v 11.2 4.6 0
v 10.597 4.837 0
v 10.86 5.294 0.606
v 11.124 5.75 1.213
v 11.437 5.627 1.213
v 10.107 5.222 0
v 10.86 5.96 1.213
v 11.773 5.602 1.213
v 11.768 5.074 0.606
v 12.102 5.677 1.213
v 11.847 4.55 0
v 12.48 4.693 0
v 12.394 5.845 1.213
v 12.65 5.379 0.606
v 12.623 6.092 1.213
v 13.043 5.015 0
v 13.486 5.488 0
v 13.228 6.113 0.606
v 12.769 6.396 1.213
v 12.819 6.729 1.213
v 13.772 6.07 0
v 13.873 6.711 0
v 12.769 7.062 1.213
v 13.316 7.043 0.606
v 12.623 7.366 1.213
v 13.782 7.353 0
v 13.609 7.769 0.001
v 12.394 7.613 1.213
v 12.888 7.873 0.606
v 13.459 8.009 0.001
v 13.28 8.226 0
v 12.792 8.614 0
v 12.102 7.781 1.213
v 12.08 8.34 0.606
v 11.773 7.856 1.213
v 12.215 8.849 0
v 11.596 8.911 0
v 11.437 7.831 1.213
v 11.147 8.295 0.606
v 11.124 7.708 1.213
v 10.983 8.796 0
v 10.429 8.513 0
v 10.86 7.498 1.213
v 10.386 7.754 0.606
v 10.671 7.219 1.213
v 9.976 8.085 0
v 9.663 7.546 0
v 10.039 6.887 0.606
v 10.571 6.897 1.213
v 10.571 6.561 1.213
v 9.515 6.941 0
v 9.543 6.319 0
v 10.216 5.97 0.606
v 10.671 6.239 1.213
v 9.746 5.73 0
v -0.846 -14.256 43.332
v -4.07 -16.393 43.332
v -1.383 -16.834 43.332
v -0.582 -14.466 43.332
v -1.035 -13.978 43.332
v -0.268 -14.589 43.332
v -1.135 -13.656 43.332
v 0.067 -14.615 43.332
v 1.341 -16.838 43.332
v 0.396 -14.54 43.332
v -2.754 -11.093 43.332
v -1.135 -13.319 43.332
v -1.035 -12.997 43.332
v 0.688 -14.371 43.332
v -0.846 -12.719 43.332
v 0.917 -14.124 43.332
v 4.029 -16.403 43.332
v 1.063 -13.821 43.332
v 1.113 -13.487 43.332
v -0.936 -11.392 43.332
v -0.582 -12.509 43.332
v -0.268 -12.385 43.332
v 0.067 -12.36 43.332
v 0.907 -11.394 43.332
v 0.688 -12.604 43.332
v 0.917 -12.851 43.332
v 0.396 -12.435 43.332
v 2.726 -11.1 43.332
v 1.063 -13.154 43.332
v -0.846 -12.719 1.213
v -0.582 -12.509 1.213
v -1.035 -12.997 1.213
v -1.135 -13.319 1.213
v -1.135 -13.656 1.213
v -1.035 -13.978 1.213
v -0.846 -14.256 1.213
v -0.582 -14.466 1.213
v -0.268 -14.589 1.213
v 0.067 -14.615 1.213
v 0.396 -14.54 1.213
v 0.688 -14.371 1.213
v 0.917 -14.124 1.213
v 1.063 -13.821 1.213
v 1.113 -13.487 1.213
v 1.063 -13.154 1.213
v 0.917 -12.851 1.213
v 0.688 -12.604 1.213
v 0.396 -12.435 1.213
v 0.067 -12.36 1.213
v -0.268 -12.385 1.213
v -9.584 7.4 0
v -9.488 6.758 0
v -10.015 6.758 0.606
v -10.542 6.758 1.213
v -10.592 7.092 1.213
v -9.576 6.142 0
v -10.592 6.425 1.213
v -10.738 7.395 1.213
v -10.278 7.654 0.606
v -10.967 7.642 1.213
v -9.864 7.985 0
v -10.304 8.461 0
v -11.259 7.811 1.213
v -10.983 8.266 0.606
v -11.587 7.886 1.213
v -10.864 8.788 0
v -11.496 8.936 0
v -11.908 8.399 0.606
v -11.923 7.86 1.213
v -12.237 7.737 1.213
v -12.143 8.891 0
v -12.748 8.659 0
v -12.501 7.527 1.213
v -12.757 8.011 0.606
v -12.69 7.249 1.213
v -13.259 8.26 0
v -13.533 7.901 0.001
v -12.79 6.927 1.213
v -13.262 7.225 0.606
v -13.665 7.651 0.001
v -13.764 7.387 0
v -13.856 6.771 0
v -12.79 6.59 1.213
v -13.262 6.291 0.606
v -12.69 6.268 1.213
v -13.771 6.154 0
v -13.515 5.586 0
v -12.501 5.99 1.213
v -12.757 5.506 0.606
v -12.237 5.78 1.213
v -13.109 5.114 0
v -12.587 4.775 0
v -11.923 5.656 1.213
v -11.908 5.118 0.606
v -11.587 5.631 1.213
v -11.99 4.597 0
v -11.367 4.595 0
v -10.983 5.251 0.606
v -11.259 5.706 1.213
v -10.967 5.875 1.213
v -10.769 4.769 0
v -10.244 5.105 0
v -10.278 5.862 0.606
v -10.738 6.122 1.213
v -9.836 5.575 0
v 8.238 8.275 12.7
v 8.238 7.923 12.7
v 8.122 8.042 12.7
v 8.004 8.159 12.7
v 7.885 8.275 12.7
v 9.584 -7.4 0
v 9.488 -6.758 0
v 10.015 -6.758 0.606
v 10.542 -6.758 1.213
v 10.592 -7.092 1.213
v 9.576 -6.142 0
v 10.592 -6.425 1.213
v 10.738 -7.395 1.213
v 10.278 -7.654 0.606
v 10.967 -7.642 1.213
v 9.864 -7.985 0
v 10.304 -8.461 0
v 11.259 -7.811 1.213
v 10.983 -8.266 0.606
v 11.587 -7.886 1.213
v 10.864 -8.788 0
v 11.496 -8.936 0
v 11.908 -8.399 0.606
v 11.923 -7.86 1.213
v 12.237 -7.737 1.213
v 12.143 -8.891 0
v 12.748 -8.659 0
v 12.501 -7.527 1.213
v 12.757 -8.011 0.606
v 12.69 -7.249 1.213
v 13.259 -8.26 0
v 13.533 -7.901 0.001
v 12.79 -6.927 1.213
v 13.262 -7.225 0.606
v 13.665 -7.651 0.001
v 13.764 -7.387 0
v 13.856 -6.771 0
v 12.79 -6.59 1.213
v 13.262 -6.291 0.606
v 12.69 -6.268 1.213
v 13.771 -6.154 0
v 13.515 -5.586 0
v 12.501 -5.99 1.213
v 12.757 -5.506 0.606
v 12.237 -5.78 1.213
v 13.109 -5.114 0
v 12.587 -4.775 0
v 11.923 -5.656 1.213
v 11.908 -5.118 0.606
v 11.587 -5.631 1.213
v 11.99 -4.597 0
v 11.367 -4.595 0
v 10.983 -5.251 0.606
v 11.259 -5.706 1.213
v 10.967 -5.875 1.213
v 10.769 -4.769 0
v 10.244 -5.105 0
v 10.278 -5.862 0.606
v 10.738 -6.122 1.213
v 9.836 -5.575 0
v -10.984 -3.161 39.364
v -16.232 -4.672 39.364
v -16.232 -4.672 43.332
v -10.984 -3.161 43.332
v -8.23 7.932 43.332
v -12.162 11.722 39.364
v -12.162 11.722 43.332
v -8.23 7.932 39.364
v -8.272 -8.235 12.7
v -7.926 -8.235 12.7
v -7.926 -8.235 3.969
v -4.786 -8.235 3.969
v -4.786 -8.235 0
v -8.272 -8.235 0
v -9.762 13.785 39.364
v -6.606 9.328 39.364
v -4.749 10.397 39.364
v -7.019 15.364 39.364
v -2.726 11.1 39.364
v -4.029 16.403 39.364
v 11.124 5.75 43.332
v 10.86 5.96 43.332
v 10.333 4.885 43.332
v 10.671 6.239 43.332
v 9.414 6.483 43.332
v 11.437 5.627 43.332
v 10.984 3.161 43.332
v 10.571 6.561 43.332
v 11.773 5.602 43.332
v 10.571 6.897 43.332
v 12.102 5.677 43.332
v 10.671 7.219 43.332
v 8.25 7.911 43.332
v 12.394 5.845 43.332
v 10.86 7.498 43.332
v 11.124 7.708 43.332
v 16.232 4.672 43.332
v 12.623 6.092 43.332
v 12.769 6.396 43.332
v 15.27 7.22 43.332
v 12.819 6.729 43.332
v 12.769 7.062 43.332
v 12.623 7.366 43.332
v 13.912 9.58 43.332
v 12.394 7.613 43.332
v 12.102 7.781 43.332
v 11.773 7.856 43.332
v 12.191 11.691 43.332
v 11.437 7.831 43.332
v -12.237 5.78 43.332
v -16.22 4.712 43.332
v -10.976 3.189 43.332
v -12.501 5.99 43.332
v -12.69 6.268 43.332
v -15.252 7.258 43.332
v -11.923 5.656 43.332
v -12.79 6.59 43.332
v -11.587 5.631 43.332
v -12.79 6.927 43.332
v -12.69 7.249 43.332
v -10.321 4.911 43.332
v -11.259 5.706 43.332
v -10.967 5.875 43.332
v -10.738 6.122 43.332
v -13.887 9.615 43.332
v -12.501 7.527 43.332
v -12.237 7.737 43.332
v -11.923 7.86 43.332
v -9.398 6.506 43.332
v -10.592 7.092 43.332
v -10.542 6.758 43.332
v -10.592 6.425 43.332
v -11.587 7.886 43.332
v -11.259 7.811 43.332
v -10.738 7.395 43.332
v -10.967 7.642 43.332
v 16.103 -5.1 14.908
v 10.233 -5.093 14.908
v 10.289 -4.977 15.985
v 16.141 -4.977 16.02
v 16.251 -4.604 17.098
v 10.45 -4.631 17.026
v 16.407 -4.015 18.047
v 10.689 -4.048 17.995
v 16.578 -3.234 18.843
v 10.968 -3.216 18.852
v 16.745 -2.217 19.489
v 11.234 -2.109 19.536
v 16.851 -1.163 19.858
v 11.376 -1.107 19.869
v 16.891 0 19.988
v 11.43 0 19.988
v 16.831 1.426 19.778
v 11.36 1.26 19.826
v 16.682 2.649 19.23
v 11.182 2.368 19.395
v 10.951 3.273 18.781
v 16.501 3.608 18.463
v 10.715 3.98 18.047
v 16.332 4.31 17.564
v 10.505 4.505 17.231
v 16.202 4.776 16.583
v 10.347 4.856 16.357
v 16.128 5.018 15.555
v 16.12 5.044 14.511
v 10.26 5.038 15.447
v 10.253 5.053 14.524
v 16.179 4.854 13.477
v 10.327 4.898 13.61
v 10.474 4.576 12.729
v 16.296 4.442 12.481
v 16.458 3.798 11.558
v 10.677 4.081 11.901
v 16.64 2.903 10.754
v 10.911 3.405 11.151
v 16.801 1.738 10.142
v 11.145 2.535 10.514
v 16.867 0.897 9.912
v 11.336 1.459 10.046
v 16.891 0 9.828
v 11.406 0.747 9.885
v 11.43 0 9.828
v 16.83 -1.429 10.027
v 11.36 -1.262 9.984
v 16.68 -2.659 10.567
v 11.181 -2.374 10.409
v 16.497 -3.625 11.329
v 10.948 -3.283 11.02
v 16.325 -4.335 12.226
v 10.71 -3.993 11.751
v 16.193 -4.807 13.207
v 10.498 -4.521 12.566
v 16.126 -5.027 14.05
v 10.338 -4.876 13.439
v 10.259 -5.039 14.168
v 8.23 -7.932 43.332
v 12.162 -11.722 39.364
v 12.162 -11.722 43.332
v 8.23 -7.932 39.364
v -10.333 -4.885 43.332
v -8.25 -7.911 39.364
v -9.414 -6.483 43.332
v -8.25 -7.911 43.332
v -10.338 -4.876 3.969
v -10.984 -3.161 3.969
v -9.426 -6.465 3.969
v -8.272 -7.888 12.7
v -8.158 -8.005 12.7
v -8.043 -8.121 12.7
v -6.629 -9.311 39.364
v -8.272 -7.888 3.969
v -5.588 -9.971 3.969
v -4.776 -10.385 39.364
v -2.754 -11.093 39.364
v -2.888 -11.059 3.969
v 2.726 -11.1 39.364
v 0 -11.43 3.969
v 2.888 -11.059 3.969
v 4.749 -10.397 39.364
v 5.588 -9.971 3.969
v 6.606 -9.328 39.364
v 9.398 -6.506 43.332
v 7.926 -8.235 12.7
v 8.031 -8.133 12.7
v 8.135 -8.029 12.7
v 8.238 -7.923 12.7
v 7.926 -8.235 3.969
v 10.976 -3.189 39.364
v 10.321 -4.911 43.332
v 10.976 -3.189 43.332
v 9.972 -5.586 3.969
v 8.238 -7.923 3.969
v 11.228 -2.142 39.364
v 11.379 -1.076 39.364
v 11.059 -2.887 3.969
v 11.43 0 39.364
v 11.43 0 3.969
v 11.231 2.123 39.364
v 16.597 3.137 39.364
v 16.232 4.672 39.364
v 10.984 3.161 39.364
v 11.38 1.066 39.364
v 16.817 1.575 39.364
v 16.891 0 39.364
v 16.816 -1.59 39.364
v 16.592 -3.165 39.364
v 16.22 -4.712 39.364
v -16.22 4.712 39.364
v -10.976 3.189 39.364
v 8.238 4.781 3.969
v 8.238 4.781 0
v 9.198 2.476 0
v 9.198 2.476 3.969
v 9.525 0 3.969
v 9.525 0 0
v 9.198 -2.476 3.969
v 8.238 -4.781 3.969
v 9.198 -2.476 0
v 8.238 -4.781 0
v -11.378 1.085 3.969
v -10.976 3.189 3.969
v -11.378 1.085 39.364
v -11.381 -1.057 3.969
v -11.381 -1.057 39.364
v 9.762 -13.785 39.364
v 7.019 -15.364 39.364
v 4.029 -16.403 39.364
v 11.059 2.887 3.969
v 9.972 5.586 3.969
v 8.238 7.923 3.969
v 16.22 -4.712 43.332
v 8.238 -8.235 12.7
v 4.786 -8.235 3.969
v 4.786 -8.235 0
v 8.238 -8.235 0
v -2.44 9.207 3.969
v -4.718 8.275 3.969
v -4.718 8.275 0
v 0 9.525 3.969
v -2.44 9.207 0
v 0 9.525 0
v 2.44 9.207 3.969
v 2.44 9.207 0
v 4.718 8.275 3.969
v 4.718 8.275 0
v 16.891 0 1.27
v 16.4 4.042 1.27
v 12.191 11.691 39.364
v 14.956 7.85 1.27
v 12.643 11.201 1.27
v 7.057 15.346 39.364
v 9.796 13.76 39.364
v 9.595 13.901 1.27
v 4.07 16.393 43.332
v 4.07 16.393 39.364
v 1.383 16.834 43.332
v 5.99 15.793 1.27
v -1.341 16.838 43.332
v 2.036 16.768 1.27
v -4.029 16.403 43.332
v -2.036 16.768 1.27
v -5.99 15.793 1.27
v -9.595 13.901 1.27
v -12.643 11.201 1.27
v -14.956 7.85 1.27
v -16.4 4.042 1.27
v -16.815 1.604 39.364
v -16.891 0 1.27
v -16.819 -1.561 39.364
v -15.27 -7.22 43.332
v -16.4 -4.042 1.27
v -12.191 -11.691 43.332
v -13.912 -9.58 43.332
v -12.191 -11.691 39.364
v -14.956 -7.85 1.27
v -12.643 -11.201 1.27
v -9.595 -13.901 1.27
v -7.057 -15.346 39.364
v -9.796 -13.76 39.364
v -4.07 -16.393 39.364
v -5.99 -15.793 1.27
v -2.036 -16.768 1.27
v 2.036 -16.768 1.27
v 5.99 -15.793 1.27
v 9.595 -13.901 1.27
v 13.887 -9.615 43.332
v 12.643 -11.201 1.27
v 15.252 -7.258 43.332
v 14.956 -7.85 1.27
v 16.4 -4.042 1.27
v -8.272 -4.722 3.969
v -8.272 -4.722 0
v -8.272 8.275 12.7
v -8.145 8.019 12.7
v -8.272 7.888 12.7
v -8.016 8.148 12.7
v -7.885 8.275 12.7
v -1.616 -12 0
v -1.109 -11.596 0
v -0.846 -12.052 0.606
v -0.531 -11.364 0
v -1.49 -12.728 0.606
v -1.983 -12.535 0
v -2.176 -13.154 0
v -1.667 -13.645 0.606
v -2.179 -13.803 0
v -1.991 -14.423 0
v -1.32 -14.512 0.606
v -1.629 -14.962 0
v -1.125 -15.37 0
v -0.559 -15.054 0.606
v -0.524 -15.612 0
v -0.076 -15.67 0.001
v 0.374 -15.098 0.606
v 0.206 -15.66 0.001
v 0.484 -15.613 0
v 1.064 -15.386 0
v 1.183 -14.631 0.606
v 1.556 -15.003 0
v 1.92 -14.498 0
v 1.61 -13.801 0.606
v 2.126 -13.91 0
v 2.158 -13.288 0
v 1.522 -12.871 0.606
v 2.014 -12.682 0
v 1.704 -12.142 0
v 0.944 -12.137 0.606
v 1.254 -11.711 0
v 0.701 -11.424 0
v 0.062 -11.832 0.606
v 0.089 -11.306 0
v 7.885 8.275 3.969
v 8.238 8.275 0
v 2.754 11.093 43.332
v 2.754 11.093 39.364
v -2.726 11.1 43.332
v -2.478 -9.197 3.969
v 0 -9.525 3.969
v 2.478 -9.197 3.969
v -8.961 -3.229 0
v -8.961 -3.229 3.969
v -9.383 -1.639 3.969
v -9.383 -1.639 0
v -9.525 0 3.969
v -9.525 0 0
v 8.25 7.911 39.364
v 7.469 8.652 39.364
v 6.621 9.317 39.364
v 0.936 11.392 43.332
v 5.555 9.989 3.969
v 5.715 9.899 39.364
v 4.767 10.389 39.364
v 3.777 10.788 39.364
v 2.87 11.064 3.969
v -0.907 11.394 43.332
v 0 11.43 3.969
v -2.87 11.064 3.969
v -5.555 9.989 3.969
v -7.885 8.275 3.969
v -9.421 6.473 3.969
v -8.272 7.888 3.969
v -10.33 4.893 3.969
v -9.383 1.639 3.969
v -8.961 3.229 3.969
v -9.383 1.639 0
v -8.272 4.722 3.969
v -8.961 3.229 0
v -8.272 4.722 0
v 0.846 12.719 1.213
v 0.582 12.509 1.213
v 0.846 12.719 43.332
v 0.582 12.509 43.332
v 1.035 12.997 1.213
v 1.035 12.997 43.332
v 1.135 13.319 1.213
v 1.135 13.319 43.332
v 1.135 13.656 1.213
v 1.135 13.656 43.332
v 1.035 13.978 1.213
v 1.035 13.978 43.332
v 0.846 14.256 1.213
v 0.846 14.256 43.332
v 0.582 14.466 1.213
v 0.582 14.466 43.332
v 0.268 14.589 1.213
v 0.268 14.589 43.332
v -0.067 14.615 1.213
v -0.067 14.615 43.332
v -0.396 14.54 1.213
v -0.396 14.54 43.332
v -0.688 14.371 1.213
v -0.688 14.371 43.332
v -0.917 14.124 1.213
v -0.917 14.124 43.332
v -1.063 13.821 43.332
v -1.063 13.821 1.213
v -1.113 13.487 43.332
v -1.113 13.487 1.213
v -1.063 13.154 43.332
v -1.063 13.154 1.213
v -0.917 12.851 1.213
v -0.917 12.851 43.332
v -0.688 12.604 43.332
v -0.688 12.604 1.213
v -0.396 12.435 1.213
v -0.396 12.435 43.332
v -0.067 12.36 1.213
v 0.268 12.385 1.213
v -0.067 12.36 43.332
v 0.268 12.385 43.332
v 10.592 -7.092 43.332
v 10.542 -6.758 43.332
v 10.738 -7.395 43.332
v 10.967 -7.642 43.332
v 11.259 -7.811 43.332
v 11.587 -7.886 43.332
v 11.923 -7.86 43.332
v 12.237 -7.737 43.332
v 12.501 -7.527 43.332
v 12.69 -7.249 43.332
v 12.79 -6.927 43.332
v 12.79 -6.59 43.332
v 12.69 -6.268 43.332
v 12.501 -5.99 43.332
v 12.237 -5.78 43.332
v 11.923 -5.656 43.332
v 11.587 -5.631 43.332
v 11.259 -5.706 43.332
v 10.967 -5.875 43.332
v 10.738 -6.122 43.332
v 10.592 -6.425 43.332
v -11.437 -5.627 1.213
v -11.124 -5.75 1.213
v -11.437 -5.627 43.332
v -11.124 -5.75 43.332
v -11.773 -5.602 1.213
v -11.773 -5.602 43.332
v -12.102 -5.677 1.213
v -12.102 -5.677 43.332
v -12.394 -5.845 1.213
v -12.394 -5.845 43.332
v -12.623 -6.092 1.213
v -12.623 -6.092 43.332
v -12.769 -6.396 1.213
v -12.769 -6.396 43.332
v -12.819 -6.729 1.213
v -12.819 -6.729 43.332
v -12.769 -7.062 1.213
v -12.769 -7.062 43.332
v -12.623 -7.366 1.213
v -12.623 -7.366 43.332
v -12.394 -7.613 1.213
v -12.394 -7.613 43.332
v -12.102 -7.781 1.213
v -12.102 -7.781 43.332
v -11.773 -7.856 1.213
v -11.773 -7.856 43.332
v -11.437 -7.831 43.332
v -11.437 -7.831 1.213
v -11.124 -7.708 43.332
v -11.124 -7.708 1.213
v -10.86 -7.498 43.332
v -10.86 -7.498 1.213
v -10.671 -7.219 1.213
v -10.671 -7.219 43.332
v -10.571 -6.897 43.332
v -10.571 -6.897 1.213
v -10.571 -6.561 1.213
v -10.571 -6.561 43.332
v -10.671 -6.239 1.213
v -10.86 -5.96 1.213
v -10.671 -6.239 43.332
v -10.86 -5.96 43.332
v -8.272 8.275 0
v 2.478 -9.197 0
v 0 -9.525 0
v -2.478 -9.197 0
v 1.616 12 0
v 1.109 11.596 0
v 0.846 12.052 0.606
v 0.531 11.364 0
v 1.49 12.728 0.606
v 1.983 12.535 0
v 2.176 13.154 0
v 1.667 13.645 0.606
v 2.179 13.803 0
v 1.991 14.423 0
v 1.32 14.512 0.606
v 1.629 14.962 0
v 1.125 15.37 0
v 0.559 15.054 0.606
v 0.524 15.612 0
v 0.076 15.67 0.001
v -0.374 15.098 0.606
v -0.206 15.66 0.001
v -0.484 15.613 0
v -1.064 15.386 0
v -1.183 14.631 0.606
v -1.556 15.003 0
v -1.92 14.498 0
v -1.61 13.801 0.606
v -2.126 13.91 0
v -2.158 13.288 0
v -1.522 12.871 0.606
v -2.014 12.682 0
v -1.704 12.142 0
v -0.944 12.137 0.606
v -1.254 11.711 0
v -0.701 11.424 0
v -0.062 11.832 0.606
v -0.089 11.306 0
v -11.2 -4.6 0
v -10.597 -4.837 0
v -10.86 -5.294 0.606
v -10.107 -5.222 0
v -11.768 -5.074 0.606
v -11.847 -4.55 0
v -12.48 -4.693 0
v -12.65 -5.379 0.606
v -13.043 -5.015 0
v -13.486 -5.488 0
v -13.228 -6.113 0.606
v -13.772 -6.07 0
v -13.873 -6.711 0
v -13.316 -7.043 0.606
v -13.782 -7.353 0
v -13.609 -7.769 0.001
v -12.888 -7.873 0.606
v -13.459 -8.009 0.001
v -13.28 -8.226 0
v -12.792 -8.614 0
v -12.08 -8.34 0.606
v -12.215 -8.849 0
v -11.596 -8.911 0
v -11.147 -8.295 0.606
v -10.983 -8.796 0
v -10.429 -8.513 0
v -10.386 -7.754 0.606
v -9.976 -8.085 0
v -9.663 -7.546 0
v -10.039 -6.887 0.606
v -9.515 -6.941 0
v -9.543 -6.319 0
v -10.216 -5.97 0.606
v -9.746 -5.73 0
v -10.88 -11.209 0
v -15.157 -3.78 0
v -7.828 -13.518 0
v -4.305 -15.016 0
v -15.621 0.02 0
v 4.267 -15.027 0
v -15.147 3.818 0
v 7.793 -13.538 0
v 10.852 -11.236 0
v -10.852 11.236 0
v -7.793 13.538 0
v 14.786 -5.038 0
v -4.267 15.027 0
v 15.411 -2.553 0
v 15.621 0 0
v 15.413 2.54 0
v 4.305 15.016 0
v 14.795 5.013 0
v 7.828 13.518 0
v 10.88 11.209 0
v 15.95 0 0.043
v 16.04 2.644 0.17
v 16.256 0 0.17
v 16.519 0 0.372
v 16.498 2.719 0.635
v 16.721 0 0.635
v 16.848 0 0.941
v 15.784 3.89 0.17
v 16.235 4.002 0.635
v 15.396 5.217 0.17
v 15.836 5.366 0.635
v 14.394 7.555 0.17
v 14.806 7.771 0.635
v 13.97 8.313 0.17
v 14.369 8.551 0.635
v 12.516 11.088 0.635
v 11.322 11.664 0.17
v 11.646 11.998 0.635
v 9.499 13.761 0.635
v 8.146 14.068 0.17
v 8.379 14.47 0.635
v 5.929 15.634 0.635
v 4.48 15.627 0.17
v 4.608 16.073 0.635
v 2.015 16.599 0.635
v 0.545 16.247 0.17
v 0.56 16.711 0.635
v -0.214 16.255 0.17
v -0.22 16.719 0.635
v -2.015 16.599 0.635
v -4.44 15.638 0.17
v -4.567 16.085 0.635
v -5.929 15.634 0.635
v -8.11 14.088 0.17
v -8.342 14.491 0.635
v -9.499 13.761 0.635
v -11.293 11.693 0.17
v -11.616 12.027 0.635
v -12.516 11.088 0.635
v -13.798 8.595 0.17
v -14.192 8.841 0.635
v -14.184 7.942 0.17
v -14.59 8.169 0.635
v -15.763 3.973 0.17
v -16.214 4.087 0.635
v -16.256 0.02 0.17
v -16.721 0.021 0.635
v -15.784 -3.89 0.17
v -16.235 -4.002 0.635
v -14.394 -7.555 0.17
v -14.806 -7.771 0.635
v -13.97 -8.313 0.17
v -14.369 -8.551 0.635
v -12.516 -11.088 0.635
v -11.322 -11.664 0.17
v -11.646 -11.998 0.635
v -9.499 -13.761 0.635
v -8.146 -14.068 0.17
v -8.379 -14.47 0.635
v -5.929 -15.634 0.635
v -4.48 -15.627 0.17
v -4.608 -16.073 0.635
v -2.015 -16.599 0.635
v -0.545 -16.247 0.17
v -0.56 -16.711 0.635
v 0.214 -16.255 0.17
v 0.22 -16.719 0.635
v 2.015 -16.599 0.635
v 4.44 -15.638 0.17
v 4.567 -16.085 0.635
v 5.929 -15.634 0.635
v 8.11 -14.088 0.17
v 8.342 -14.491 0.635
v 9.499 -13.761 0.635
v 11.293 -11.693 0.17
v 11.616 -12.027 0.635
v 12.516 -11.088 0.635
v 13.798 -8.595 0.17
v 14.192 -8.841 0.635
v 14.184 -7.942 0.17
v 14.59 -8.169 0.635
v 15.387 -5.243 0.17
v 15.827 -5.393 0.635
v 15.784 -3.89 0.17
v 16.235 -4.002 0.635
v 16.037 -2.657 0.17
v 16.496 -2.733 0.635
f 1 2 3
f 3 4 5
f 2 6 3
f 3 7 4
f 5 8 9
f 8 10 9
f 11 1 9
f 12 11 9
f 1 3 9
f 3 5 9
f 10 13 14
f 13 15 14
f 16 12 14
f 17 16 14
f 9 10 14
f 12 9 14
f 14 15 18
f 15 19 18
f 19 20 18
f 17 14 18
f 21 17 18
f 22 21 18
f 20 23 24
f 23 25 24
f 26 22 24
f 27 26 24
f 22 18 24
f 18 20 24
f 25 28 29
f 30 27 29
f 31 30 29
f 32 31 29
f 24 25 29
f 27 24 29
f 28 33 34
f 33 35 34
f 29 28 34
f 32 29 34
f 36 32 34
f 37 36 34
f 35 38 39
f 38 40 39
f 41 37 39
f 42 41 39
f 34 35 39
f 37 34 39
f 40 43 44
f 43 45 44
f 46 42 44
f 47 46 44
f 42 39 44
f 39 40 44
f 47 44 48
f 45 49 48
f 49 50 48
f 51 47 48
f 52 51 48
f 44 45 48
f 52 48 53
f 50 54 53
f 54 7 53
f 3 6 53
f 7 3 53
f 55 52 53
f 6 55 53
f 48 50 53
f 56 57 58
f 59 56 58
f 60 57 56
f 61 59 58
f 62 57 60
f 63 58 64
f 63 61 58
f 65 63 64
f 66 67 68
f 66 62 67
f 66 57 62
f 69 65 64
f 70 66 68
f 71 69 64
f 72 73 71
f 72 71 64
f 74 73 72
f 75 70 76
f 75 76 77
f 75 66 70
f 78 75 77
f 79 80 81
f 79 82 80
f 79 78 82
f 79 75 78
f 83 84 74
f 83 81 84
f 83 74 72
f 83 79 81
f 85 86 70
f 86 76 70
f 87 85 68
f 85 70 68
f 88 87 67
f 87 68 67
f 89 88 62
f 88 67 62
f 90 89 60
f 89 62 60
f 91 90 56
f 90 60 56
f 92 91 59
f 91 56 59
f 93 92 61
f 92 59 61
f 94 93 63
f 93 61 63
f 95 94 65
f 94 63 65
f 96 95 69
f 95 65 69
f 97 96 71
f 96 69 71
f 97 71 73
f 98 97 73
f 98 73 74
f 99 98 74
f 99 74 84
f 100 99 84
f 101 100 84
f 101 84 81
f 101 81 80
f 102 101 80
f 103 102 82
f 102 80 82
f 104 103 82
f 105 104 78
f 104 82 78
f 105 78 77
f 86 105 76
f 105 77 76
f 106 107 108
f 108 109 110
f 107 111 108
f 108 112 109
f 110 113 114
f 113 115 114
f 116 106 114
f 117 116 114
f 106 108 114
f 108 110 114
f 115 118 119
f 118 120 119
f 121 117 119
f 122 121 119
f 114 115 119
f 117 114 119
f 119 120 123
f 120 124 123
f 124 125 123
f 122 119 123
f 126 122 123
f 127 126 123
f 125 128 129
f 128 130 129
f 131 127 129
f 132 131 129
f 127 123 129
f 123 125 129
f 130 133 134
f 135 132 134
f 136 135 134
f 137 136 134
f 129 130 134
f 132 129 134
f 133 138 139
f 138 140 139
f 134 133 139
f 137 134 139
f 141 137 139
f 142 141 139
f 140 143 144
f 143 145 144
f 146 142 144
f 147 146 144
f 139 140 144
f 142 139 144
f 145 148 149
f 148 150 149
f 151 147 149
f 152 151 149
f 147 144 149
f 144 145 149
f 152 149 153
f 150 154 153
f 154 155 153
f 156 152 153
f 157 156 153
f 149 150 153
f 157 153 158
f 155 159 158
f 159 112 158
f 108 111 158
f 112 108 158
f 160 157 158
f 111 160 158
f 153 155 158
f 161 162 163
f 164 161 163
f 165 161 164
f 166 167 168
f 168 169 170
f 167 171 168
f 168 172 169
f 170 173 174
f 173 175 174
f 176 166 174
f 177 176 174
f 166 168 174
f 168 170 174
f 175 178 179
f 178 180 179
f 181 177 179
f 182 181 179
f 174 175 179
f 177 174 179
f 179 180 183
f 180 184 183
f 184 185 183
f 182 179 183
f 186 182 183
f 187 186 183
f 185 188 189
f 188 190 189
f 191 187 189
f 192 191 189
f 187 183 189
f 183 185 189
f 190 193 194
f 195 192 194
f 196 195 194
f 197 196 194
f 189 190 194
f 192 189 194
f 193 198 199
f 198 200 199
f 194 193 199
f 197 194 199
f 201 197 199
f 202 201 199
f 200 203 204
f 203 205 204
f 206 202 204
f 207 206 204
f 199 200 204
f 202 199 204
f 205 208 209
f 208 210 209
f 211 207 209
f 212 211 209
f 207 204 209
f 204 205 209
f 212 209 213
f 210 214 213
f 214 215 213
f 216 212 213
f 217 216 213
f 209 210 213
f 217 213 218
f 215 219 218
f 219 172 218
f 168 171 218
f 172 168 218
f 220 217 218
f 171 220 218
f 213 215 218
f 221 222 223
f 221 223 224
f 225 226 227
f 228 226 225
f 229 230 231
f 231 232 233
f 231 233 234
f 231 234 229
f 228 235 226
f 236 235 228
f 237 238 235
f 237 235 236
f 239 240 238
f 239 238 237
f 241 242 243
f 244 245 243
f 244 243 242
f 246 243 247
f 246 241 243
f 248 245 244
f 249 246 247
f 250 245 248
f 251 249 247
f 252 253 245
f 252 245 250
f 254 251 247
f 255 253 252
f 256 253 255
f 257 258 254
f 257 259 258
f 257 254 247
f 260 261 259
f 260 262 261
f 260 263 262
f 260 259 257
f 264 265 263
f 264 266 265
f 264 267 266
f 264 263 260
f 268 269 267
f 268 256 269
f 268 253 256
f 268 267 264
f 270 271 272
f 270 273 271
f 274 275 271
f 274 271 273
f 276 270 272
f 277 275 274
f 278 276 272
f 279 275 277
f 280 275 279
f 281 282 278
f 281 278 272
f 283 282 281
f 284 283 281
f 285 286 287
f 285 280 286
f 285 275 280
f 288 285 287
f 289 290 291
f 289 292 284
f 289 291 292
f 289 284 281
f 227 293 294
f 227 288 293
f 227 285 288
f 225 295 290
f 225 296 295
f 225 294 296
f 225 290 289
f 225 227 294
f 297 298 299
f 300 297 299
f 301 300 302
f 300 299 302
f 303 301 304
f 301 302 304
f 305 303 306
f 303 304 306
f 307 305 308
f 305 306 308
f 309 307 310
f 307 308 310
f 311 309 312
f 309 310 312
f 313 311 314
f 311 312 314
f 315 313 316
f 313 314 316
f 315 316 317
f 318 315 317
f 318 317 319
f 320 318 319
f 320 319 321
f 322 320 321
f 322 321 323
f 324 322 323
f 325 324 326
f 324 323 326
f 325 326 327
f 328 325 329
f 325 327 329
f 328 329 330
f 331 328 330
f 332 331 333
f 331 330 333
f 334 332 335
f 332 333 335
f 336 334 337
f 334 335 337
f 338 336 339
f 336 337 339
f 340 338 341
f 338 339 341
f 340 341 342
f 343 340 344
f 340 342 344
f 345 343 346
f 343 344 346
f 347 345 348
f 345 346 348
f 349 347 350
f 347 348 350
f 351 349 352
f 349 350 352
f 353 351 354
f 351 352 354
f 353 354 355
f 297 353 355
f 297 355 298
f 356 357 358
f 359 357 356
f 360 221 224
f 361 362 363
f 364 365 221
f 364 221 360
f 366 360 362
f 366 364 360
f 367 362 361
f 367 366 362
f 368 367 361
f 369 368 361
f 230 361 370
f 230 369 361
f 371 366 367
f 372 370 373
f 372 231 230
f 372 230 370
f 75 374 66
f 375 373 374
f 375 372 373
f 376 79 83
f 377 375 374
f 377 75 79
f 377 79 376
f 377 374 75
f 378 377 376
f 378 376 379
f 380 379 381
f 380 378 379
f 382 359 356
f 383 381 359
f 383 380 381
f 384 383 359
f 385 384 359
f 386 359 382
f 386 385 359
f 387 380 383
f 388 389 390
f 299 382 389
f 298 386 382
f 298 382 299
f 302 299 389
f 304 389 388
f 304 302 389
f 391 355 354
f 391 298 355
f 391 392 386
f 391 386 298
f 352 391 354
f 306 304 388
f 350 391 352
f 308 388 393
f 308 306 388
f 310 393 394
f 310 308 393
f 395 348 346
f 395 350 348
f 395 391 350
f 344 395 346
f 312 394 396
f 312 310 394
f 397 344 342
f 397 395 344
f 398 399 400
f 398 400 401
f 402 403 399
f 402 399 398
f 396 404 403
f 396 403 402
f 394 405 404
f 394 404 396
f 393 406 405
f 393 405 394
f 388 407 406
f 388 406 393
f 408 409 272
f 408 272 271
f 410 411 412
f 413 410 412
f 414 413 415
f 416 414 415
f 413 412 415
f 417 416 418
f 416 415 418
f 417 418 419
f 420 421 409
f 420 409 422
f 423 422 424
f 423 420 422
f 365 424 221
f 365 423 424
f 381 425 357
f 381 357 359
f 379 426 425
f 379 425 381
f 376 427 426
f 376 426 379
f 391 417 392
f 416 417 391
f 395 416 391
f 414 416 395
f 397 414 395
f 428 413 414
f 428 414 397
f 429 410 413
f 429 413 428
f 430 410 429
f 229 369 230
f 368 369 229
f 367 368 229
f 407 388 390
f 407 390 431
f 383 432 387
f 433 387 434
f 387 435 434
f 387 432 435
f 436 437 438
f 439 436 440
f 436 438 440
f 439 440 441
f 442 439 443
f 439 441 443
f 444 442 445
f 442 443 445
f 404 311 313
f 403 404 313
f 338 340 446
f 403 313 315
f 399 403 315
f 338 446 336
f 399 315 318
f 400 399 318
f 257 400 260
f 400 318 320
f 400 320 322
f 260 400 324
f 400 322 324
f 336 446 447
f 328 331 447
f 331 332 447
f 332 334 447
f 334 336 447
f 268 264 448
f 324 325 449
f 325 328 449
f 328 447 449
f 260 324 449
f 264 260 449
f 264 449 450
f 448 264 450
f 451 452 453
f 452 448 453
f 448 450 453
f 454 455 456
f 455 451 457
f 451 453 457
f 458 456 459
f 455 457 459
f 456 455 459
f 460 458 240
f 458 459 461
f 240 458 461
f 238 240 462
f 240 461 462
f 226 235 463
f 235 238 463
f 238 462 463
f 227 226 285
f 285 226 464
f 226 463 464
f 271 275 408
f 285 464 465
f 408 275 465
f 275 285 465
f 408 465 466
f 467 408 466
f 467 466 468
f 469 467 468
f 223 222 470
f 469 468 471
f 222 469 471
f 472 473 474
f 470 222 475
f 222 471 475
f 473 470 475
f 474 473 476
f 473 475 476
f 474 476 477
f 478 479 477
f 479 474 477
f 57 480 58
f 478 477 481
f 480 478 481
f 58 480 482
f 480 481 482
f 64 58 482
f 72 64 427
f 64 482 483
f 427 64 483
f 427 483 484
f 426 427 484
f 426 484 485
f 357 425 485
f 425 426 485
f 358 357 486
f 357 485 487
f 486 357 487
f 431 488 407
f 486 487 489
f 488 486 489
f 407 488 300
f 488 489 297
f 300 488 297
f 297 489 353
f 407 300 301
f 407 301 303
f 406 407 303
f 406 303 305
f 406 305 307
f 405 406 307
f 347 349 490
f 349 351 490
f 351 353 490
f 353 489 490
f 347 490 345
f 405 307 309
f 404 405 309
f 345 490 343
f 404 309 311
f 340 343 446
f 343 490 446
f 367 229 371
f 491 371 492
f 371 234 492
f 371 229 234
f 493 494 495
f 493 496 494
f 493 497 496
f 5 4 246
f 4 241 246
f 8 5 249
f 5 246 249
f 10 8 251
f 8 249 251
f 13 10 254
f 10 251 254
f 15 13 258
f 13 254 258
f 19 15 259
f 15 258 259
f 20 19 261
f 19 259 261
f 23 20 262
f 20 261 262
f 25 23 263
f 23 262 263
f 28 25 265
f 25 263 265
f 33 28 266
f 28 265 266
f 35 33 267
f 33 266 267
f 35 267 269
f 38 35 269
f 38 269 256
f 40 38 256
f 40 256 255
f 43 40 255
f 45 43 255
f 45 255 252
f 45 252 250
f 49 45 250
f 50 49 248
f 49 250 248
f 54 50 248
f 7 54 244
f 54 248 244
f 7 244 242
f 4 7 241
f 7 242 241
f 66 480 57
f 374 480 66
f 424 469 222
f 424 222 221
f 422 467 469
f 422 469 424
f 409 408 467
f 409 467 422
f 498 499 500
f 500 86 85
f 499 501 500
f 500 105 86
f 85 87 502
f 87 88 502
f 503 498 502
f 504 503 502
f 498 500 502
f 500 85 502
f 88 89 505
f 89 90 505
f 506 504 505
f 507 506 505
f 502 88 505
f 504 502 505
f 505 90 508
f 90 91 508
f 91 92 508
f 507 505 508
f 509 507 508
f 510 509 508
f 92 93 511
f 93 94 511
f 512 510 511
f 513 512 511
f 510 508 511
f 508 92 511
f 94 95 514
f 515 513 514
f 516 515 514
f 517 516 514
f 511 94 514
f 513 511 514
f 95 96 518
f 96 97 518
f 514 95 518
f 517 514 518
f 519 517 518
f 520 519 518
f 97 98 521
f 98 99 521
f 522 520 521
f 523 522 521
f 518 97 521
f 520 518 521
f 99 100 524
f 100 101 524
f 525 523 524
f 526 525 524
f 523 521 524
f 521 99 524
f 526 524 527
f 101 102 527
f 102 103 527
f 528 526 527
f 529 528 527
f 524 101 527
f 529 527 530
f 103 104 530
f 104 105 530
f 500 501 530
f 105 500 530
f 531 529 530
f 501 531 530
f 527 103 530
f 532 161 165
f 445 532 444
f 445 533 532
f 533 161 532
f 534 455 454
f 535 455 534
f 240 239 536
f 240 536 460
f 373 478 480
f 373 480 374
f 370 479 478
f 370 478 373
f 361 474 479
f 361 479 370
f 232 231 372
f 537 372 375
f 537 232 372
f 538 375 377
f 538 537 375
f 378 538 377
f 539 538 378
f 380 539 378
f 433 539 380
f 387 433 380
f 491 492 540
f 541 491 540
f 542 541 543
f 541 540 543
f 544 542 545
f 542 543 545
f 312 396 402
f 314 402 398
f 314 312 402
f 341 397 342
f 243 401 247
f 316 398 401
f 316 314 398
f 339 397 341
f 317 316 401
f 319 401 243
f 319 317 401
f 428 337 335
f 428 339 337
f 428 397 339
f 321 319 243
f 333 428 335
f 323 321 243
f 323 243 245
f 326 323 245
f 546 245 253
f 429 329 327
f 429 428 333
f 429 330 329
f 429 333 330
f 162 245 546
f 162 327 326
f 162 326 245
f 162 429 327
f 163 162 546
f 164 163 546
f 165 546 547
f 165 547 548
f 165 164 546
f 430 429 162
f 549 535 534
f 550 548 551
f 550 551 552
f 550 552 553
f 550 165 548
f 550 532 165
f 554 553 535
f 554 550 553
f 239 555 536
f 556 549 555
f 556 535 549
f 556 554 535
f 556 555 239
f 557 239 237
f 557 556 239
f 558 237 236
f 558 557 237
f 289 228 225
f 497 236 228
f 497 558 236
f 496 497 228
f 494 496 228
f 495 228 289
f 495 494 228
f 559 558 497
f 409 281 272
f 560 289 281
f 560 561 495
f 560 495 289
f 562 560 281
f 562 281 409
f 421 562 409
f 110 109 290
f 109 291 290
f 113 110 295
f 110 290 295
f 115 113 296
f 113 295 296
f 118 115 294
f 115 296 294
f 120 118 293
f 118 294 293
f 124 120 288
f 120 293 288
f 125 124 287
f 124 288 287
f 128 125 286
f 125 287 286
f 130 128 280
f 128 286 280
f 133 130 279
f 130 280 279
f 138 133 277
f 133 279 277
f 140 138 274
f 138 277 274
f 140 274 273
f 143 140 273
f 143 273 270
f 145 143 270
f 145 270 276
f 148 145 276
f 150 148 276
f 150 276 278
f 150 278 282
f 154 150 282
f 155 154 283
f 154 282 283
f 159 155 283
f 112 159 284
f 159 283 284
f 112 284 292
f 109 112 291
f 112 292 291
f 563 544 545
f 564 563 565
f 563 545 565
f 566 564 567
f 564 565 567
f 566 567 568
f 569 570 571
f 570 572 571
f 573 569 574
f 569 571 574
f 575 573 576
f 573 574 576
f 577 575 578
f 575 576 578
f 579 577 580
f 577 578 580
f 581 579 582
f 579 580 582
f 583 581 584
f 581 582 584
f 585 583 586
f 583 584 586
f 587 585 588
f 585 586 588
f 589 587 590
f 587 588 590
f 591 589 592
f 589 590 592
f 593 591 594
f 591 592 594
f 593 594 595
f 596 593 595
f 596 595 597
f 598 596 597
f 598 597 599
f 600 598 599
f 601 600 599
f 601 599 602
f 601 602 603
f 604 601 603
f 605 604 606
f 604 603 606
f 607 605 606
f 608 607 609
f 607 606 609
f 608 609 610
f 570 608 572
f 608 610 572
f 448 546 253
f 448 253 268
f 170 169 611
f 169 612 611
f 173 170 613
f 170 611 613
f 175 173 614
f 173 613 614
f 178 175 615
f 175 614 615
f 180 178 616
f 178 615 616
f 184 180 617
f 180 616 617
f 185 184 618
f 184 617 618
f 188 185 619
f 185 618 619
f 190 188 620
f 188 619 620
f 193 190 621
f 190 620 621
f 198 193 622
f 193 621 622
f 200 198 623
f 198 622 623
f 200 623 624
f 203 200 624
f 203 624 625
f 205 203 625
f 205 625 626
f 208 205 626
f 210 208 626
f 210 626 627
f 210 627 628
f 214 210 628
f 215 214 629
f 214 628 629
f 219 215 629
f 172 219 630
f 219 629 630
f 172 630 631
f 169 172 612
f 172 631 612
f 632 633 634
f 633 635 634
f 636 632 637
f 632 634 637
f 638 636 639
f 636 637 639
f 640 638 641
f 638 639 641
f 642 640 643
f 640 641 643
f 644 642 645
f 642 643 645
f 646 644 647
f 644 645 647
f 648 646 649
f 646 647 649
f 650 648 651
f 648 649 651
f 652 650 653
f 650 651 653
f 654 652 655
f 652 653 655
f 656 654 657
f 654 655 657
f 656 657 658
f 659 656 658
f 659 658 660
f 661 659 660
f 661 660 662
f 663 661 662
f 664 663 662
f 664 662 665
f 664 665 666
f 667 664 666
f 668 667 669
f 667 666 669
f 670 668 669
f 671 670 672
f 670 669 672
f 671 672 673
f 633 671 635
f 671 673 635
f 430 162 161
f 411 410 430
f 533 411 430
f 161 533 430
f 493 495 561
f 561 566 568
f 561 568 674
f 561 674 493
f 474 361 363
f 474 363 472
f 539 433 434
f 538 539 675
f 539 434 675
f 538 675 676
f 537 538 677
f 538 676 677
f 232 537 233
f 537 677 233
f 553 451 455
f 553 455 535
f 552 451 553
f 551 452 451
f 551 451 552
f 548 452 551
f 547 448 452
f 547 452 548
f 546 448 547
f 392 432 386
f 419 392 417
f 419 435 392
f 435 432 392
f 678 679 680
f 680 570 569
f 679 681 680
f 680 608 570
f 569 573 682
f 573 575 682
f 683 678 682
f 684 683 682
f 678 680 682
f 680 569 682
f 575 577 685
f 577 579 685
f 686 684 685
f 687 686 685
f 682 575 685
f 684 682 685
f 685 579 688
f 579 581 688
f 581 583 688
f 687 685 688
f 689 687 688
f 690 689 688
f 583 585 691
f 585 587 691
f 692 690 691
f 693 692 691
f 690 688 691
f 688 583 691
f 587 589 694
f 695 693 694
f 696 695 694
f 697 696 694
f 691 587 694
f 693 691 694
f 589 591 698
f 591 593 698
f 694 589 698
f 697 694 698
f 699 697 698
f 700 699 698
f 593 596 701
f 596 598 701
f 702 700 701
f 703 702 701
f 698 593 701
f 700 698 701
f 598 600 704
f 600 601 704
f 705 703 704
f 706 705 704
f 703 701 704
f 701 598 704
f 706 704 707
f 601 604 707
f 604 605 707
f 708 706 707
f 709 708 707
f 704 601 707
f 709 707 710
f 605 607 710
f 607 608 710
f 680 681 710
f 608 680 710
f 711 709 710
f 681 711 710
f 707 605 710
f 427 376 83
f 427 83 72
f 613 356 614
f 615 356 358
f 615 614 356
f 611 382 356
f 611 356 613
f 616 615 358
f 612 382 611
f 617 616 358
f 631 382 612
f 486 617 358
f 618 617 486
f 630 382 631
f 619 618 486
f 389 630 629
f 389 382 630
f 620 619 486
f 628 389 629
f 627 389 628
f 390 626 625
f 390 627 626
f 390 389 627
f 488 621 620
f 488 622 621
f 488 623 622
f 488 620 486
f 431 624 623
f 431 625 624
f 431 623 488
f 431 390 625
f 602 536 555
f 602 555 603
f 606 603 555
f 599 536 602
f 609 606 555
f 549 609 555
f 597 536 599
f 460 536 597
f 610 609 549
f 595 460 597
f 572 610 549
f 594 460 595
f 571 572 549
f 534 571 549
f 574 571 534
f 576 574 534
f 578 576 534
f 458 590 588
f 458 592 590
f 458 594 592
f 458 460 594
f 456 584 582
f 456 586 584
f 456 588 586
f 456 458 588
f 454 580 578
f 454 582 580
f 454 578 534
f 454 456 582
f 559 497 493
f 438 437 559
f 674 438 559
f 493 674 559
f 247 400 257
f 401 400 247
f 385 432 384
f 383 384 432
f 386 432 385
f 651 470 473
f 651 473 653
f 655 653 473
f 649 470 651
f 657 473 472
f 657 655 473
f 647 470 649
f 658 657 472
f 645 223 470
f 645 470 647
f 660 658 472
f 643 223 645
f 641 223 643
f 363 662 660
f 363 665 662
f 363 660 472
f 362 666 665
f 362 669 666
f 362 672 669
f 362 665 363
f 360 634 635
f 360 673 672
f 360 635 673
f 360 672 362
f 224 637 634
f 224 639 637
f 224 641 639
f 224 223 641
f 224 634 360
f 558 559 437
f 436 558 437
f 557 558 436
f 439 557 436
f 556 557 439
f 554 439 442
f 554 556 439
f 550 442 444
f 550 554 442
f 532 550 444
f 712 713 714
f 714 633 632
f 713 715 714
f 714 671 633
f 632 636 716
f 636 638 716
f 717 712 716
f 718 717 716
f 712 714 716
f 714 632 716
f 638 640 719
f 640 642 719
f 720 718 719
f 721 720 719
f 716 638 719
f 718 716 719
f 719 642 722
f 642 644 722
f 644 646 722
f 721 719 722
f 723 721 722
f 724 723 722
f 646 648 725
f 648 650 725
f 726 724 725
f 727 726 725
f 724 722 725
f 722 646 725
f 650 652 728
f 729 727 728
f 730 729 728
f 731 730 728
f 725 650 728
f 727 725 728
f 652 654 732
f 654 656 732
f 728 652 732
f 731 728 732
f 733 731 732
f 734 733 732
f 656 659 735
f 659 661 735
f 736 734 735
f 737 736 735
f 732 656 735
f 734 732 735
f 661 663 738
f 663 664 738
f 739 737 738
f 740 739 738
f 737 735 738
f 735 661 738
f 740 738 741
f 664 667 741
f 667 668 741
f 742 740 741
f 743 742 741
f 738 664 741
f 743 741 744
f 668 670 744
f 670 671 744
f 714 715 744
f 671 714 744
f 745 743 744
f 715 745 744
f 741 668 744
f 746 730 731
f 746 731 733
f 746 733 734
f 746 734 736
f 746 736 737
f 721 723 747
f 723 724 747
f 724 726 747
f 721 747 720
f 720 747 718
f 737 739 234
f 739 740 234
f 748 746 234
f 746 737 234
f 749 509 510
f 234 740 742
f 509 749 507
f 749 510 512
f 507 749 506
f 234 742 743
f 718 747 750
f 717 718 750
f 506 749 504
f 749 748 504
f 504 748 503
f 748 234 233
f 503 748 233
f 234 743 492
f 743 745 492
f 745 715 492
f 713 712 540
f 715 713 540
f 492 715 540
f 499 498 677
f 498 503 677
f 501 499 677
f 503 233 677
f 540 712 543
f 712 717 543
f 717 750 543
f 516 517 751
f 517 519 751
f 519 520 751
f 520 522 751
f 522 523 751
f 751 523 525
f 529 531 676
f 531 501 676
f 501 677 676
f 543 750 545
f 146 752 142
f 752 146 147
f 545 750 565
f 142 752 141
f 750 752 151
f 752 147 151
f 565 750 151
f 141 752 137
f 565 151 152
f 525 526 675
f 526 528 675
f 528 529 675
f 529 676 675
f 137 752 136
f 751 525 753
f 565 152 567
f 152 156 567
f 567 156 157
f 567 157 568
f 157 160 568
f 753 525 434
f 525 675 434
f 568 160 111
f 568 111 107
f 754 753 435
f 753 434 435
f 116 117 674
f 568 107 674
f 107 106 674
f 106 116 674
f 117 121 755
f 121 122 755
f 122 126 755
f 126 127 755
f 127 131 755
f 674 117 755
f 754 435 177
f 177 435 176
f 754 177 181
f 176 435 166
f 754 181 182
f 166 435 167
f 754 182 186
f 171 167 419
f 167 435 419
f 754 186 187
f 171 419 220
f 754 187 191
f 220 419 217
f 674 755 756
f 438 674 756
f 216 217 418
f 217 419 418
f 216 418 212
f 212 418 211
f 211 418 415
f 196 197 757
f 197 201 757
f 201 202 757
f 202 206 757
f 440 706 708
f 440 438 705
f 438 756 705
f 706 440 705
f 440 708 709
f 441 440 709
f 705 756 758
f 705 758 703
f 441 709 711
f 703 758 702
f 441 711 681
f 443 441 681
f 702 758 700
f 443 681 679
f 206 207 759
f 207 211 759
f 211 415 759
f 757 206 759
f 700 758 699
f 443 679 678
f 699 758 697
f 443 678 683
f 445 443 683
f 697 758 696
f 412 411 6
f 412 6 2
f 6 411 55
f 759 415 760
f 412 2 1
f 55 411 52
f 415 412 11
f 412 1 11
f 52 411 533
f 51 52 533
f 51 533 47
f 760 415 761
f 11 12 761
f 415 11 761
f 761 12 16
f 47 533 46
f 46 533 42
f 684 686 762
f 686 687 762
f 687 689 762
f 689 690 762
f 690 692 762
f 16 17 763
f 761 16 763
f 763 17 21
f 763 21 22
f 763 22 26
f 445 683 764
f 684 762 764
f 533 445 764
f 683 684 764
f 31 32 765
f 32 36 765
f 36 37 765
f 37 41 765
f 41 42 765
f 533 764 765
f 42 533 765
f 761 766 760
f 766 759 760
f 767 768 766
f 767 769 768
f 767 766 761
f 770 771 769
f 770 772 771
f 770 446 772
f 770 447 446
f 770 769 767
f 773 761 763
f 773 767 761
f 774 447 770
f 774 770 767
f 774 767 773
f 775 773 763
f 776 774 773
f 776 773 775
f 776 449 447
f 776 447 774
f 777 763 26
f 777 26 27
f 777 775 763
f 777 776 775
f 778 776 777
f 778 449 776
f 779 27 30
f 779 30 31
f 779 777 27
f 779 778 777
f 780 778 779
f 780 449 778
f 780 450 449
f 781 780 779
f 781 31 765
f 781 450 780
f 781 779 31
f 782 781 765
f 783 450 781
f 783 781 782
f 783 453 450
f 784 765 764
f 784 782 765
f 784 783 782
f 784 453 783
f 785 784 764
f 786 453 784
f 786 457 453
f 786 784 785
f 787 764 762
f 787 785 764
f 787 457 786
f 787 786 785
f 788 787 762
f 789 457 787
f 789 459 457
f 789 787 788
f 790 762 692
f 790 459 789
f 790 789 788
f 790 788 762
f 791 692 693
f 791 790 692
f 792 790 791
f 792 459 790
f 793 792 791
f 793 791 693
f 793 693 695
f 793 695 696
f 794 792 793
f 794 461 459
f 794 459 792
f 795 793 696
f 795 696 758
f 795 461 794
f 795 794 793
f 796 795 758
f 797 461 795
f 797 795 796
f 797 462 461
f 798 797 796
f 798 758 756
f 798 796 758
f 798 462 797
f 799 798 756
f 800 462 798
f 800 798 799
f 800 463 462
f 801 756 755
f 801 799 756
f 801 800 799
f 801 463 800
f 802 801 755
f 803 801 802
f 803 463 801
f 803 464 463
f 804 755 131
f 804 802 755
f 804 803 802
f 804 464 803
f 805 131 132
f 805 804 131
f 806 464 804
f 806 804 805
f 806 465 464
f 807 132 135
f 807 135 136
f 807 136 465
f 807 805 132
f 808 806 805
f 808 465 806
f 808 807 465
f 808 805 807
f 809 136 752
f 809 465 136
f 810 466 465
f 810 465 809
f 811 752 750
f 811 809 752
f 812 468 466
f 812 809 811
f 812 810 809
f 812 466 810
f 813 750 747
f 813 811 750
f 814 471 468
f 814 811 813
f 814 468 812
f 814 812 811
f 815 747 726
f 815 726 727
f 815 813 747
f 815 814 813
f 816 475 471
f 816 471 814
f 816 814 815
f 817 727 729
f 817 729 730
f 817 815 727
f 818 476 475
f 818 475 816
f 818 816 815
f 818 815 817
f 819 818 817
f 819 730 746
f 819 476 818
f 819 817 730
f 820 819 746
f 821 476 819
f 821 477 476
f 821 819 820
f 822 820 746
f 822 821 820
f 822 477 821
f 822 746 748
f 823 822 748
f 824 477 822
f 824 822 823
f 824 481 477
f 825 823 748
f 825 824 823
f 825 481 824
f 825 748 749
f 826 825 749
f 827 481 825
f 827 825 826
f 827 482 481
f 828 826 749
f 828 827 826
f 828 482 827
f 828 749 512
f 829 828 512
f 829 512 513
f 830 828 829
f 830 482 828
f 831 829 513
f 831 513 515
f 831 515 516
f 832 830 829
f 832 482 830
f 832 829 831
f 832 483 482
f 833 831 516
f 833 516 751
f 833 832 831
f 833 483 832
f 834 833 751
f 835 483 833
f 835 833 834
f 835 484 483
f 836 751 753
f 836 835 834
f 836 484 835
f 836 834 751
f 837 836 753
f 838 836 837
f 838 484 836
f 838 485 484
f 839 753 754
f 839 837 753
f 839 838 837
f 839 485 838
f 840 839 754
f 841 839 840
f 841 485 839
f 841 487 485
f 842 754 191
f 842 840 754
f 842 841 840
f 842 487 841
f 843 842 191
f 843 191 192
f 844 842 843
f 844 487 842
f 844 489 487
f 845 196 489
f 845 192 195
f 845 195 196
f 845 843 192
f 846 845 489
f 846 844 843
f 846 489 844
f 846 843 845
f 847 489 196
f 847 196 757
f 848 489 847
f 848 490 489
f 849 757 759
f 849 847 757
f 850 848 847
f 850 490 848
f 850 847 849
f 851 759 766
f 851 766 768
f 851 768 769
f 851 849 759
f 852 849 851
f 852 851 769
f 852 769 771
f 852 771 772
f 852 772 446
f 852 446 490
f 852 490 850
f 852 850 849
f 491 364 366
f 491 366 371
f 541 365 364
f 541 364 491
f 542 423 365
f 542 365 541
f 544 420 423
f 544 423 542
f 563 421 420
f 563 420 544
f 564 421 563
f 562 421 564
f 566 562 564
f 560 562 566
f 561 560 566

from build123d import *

# Parameters (mm, degrees)
SKETCH1_R                                      = 16.891
BOSS_EXTRUDE1_DEPTH                            = 43.3324
SKETCH9_R                                      = 9.525
CUT_EXTRUDE6_DEPTH                             = 50.480386536
SKETCH10_R                                     = 11.43
BOSS_EXTRUDE2_DEPTH                            = 19.05
CUT_EXTRUDE7_START                             = -39.36365
SKETCH11_R                                     = 9.525
CUT_EXTRUDE7_DEPTH                             = 39.36365
CUT_EXTRUDE8_START                             = -3.96875
CUT_EXTRUDE8_DEPTH                             = 3.96875
CSK_FOR_2_FLAT_HEAD_MACHINE_SCREW1_D           = 2.2606
CSK_FOR_2_FLAT_HEAD_MACHINE_SCREW1_CSINK_D     = 4.3688
CSK_FOR_2_FLAT_HEAD_MACHINE_SCREW1_CSINK_ANGLE = 82
CIRPATTERN1_COUNT                              = 6
F_1_2_0_4_DIAMETER_HOLE1_D                     = 10.16
F_1_2_0_4_DIAMETER_HOLE1_DEPTH                 = 12.7
F_1_2_0_4_DIAMETER_HOLE1_TIP                   = 3.052371945
FILLET1_R                                      = 1.27
SKETCH16_W                                     = 16.51
SKETCH16_H                                     = 16.51
CUT_EXTRUDE9_DEPTH                             = 12.7


with BuildPart() as part:
    # Sketch1 → Boss-Extrude1 (new body)
    with BuildSketch(Plane.XY):
        Circle(SKETCH1_R)
    extrude(amount=BOSS_EXTRUDE1_DEPTH)

    # Sketch9 → Cut-Extrude6 (cut, through all)
    with BuildSketch(Plane(origin=(0, 0, 0), x_dir=(-1, 0, 0), z_dir=(0, 0, -1))):
        Circle(SKETCH9_R)
        with BuildLine():
            ThreePointArc((-5.359640753, -7.874), (0, -9.525), (5.359640753, -7.874))
            Line((5.359640753, -7.874), (-5.359640753, -7.874))
        make_face()
        with BuildLine():
            ThreePointArc((-7.874, 5.359640753), (-9.525, 0), (-7.874, -5.359640753))
            Line((-7.874, -5.359640753), (-7.874, 5.359640753))
        make_face()
        with BuildLine():
            Line((-5.359640753, 7.874), (5.359640753, 7.874))
            ThreePointArc((5.359640753, 7.874), (0, 9.525), (-5.359640753, 7.874))
        make_face()
        with BuildLine():
            Line((7.874, 5.359640753), (7.874, -5.359640753))
            ThreePointArc((7.874, -5.359640753), (9.102897204, -2.804084075), (9.525, 0))
            ThreePointArc((9.525, 0), (9.102897204, 2.804084075), (7.874, 5.359640753))
        make_face()
    extrude(amount=-CUT_EXTRUDE6_DEPTH, mode=Mode.SUBTRACT)

    # Sketch10 → Boss-Extrude2 (add)
    # profile 1 of 2: a face of its own
    with BuildSketch(Plane(origin=(0, 0, 0), x_dir=(-1, 0, 0), z_dir=(0, 0, -1))):
        Circle(SKETCH10_R)
        with BuildLine():
            ThreePointArc((-5.359640753, -7.874), (-4.453933477, 8.419507206), (9.525, 0))
            ThreePointArc((9.525, 0), (8.419507206, -4.453933477), (5.359640753, -7.874))
            ThreePointArc((5.359640753, -7.874), (0, -9.525), (-5.359640753, -7.874))
        make_face(mode=Mode.SUBTRACT)
    # profile 2 of 2: a face of its own
    with BuildSketch(Plane(origin=(0, 0, 0), x_dir=(-1, 0, 0), z_dir=(0, 0, -1))):
        Circle(SKETCH10_R)
        with BuildLine():
            ThreePointArc((-5.359640753, -7.874), (-4.453933477, 8.419507206), (9.525, 0))
            ThreePointArc((9.525, 0), (8.419507206, -4.453933477), (5.359640753, -7.874))
            ThreePointArc((5.359640753, -7.874), (0, -9.525), (-5.359640753, -7.874))
        make_face(mode=Mode.SUBTRACT)
    extrude(amount=-BOSS_EXTRUDE2_DEPTH)

    # Sketch11 → Cut-Extrude7 (cut)
    with BuildSketch(Plane.XY.offset(43.3324).offset(CUT_EXTRUDE7_START)):
        with BuildLine():
            Line((-9.153468369, -2.634319991), (-10.984162043, -3.161183989))
            ThreePointArc((-10.984162043, -3.161183989), (1.596234295, -11.317991698), (11.43, 0))
            ThreePointArc((11.43, 0), (1.610471515, 11.315974615), (-10.976173491, 3.188810986))
            Line((-10.976173491, 3.188810986), (-9.146811242, 2.657342489))
            ThreePointArc((-9.146811242, 2.657342489), (1.342059596, 9.429978846), (9.525, 0))
            ThreePointArc((9.525, 0), (1.330195246, -9.431659748), (-9.153468369, -2.634319991))
        make_face()
        with Locations(Location((0, 0, 0), (0, 0, 180))):
            Circle(SKETCH11_R)
        with BuildLine():
            ThreePointArc((-10.984162043, -3.161183989), (-11.297244321, 0.014212394), (-10.976173491, 3.188810986))
            Line((-10.976173491, 3.188810986), (0, 0))
            Line((0, 0), (-10.984162043, -3.161183989))
        make_face()
        with BuildLine():
            ThreePointArc((-10.976173491, 3.188810986), (-11.429990955, 0.014379395), (-10.984162043, -3.161183989))
            ThreePointArc((-10.984162043, -3.161183989), (-11.297244321, 0.014212394), (-10.976173491, 3.188810986))
        make_face()
    extrude(amount=CUT_EXTRUDE7_DEPTH, mode=Mode.SUBTRACT)

    # Sketch11<4> → Cut-Extrude8 (cut)
    with BuildSketch(Plane.XY.offset(43.3324).offset(CUT_EXTRUDE8_START)):
        with BuildLine():
            ThreePointArc((-10.976173491, 3.188810986), (-11.297244321, 0.014212394), (-10.984162043, -3.161183989))
            Line((-10.984162043, -3.161183989), (0, 0))
            Line((0, 0), (-10.976173491, 3.188810986))
        make_face()
        with BuildLine():
            ThreePointArc((-10.976173491, 3.188810986), (-11.429990955, 0.014379395), (-10.984162043, -3.161183989))
            ThreePointArc((-10.984162043, -3.161183989), (-11.297244321, 0.014212394), (-10.976173491, 3.188810986))
        make_face()
        with BuildLine():
            Line((-16.232150575, -4.67152745), (-10.984162043, -3.161183989))
            ThreePointArc((-10.984162043, -3.161183989), (-11.429990955, 0.014379395), (-10.976173491, 3.188810986))
            Line((-10.976173491, 3.188810986), (-16.220345269, 4.712354013))
            ThreePointArc((-16.220345269, 4.712354013), (-16.925737574, 0.021293268), (-16.232150575, -4.67152745))
        make_face()
        with BuildLine():
            Line((0, 0), (-10.984162043, -3.161183989))
            ThreePointArc((-10.984162043, -3.161183989), (1.596234295, -11.317991698), (11.43, 0))
            ThreePointArc((11.43, 0), (1.610471515, 11.315974615), (-10.976173491, 3.188810986))
            Line((-10.976173491, 3.188810986), (0, 0))
        make_face()
    cut_extrude8 = extrude(amount=CUT_EXTRUDE8_DEPTH, mode=Mode.SUBTRACT)

    # CSK for #2 Flat Head Machine Screw1 (through all)
    with Locations(Plane(origin=(0, 0, 0), x_dir=(-1, 0, 0), z_dir=(0, 0, -1))):
        with Locations((11.671937945, 6.75838911)):
            csk_for_2_flat_head_machine_screw1 = CounterSinkHole(CSK_FOR_2_FLAT_HEAD_MACHINE_SCREW1_D / 2, CSK_FOR_2_FLAT_HEAD_MACHINE_SCREW1_CSINK_D / 2, counter_sink_angle=CSK_FOR_2_FLAT_HEAD_MACHINE_SCREW1_CSINK_ANGLE)

    # CirPattern1: Cut-Extrude8, CSK for #2 Flat Head Machine Screw1 ×6 about axis
    cirpattern1_axis = Axis((0, 0, 0), (0, 0, 1))
    add([cut_extrude8.rotate(cirpattern1_axis, i * 360 / CIRPATTERN1_COUNT) for i in range(1, CIRPATTERN1_COUNT)], mode=Mode.SUBTRACT)
    add([csk_for_2_flat_head_machine_screw1.rotate(cirpattern1_axis, i * 360 / CIRPATTERN1_COUNT) for i in range(1, CIRPATTERN1_COUNT)], mode=Mode.SUBTRACT)

    # 1/2 (0.4) Diameter Hole1
    with Locations(Plane(origin=(16.890986634, -0.02124955, 14.908061188), x_dir=(0.001258039772, 0.999999208668, 0), z_dir=(0.999999208668, -0.001258039772, 0))):
        with Locations((0, 0)):
            Hole(F_1_2_0_4_DIAMETER_HOLE1_D / 2, depth=F_1_2_0_4_DIAMETER_HOLE1_DEPTH)
            with Locations((0, 0, -(F_1_2_0_4_DIAMETER_HOLE1_DEPTH + F_1_2_0_4_DIAMETER_HOLE1_TIP / 2))):  # 118° drill point
                Cone(0, F_1_2_0_4_DIAMETER_HOLE1_D / 2, F_1_2_0_4_DIAMETER_HOLE1_TIP, mode=Mode.SUBTRACT)

    # Fillet1
    # the kernel refuses this fillet: 1.27 mm, written as the material it takes off along each edge
    with BuildSketch(Plane(origin=(0, 0, 0), x_dir=(1, 0, 0), z_dir=(0, -1, 0))) as fillet1_piece_1:
        with BuildLine():
            CenterArc((16.891 - FILLET1_R, FILLET1_R), FILLET1_R, 270, 90)
            Line((16.891 - FILLET1_R, 0), (16.891, 0))
            Line((16.891, 0), (16.891, FILLET1_R))
        make_face()
    revolve(axis=Axis((0, 0, 0), (0, 0, 1)), mode=Mode.SUBTRACT)

    # Sketch16 → Cut-Extrude9 (cut)
    with BuildSketch(Plane(origin=(0, 0, 0), x_dir=(-1, 0, 0), z_dir=(0, 0, -1))):
        with Locations((0.016967686, 0.019651839)):
            Rectangle(SKETCH16_W, SKETCH16_H)
    extrude(amount=-CUT_EXTRUDE9_DEPTH, mode=Mode.SUBTRACT)


solid = part.part
